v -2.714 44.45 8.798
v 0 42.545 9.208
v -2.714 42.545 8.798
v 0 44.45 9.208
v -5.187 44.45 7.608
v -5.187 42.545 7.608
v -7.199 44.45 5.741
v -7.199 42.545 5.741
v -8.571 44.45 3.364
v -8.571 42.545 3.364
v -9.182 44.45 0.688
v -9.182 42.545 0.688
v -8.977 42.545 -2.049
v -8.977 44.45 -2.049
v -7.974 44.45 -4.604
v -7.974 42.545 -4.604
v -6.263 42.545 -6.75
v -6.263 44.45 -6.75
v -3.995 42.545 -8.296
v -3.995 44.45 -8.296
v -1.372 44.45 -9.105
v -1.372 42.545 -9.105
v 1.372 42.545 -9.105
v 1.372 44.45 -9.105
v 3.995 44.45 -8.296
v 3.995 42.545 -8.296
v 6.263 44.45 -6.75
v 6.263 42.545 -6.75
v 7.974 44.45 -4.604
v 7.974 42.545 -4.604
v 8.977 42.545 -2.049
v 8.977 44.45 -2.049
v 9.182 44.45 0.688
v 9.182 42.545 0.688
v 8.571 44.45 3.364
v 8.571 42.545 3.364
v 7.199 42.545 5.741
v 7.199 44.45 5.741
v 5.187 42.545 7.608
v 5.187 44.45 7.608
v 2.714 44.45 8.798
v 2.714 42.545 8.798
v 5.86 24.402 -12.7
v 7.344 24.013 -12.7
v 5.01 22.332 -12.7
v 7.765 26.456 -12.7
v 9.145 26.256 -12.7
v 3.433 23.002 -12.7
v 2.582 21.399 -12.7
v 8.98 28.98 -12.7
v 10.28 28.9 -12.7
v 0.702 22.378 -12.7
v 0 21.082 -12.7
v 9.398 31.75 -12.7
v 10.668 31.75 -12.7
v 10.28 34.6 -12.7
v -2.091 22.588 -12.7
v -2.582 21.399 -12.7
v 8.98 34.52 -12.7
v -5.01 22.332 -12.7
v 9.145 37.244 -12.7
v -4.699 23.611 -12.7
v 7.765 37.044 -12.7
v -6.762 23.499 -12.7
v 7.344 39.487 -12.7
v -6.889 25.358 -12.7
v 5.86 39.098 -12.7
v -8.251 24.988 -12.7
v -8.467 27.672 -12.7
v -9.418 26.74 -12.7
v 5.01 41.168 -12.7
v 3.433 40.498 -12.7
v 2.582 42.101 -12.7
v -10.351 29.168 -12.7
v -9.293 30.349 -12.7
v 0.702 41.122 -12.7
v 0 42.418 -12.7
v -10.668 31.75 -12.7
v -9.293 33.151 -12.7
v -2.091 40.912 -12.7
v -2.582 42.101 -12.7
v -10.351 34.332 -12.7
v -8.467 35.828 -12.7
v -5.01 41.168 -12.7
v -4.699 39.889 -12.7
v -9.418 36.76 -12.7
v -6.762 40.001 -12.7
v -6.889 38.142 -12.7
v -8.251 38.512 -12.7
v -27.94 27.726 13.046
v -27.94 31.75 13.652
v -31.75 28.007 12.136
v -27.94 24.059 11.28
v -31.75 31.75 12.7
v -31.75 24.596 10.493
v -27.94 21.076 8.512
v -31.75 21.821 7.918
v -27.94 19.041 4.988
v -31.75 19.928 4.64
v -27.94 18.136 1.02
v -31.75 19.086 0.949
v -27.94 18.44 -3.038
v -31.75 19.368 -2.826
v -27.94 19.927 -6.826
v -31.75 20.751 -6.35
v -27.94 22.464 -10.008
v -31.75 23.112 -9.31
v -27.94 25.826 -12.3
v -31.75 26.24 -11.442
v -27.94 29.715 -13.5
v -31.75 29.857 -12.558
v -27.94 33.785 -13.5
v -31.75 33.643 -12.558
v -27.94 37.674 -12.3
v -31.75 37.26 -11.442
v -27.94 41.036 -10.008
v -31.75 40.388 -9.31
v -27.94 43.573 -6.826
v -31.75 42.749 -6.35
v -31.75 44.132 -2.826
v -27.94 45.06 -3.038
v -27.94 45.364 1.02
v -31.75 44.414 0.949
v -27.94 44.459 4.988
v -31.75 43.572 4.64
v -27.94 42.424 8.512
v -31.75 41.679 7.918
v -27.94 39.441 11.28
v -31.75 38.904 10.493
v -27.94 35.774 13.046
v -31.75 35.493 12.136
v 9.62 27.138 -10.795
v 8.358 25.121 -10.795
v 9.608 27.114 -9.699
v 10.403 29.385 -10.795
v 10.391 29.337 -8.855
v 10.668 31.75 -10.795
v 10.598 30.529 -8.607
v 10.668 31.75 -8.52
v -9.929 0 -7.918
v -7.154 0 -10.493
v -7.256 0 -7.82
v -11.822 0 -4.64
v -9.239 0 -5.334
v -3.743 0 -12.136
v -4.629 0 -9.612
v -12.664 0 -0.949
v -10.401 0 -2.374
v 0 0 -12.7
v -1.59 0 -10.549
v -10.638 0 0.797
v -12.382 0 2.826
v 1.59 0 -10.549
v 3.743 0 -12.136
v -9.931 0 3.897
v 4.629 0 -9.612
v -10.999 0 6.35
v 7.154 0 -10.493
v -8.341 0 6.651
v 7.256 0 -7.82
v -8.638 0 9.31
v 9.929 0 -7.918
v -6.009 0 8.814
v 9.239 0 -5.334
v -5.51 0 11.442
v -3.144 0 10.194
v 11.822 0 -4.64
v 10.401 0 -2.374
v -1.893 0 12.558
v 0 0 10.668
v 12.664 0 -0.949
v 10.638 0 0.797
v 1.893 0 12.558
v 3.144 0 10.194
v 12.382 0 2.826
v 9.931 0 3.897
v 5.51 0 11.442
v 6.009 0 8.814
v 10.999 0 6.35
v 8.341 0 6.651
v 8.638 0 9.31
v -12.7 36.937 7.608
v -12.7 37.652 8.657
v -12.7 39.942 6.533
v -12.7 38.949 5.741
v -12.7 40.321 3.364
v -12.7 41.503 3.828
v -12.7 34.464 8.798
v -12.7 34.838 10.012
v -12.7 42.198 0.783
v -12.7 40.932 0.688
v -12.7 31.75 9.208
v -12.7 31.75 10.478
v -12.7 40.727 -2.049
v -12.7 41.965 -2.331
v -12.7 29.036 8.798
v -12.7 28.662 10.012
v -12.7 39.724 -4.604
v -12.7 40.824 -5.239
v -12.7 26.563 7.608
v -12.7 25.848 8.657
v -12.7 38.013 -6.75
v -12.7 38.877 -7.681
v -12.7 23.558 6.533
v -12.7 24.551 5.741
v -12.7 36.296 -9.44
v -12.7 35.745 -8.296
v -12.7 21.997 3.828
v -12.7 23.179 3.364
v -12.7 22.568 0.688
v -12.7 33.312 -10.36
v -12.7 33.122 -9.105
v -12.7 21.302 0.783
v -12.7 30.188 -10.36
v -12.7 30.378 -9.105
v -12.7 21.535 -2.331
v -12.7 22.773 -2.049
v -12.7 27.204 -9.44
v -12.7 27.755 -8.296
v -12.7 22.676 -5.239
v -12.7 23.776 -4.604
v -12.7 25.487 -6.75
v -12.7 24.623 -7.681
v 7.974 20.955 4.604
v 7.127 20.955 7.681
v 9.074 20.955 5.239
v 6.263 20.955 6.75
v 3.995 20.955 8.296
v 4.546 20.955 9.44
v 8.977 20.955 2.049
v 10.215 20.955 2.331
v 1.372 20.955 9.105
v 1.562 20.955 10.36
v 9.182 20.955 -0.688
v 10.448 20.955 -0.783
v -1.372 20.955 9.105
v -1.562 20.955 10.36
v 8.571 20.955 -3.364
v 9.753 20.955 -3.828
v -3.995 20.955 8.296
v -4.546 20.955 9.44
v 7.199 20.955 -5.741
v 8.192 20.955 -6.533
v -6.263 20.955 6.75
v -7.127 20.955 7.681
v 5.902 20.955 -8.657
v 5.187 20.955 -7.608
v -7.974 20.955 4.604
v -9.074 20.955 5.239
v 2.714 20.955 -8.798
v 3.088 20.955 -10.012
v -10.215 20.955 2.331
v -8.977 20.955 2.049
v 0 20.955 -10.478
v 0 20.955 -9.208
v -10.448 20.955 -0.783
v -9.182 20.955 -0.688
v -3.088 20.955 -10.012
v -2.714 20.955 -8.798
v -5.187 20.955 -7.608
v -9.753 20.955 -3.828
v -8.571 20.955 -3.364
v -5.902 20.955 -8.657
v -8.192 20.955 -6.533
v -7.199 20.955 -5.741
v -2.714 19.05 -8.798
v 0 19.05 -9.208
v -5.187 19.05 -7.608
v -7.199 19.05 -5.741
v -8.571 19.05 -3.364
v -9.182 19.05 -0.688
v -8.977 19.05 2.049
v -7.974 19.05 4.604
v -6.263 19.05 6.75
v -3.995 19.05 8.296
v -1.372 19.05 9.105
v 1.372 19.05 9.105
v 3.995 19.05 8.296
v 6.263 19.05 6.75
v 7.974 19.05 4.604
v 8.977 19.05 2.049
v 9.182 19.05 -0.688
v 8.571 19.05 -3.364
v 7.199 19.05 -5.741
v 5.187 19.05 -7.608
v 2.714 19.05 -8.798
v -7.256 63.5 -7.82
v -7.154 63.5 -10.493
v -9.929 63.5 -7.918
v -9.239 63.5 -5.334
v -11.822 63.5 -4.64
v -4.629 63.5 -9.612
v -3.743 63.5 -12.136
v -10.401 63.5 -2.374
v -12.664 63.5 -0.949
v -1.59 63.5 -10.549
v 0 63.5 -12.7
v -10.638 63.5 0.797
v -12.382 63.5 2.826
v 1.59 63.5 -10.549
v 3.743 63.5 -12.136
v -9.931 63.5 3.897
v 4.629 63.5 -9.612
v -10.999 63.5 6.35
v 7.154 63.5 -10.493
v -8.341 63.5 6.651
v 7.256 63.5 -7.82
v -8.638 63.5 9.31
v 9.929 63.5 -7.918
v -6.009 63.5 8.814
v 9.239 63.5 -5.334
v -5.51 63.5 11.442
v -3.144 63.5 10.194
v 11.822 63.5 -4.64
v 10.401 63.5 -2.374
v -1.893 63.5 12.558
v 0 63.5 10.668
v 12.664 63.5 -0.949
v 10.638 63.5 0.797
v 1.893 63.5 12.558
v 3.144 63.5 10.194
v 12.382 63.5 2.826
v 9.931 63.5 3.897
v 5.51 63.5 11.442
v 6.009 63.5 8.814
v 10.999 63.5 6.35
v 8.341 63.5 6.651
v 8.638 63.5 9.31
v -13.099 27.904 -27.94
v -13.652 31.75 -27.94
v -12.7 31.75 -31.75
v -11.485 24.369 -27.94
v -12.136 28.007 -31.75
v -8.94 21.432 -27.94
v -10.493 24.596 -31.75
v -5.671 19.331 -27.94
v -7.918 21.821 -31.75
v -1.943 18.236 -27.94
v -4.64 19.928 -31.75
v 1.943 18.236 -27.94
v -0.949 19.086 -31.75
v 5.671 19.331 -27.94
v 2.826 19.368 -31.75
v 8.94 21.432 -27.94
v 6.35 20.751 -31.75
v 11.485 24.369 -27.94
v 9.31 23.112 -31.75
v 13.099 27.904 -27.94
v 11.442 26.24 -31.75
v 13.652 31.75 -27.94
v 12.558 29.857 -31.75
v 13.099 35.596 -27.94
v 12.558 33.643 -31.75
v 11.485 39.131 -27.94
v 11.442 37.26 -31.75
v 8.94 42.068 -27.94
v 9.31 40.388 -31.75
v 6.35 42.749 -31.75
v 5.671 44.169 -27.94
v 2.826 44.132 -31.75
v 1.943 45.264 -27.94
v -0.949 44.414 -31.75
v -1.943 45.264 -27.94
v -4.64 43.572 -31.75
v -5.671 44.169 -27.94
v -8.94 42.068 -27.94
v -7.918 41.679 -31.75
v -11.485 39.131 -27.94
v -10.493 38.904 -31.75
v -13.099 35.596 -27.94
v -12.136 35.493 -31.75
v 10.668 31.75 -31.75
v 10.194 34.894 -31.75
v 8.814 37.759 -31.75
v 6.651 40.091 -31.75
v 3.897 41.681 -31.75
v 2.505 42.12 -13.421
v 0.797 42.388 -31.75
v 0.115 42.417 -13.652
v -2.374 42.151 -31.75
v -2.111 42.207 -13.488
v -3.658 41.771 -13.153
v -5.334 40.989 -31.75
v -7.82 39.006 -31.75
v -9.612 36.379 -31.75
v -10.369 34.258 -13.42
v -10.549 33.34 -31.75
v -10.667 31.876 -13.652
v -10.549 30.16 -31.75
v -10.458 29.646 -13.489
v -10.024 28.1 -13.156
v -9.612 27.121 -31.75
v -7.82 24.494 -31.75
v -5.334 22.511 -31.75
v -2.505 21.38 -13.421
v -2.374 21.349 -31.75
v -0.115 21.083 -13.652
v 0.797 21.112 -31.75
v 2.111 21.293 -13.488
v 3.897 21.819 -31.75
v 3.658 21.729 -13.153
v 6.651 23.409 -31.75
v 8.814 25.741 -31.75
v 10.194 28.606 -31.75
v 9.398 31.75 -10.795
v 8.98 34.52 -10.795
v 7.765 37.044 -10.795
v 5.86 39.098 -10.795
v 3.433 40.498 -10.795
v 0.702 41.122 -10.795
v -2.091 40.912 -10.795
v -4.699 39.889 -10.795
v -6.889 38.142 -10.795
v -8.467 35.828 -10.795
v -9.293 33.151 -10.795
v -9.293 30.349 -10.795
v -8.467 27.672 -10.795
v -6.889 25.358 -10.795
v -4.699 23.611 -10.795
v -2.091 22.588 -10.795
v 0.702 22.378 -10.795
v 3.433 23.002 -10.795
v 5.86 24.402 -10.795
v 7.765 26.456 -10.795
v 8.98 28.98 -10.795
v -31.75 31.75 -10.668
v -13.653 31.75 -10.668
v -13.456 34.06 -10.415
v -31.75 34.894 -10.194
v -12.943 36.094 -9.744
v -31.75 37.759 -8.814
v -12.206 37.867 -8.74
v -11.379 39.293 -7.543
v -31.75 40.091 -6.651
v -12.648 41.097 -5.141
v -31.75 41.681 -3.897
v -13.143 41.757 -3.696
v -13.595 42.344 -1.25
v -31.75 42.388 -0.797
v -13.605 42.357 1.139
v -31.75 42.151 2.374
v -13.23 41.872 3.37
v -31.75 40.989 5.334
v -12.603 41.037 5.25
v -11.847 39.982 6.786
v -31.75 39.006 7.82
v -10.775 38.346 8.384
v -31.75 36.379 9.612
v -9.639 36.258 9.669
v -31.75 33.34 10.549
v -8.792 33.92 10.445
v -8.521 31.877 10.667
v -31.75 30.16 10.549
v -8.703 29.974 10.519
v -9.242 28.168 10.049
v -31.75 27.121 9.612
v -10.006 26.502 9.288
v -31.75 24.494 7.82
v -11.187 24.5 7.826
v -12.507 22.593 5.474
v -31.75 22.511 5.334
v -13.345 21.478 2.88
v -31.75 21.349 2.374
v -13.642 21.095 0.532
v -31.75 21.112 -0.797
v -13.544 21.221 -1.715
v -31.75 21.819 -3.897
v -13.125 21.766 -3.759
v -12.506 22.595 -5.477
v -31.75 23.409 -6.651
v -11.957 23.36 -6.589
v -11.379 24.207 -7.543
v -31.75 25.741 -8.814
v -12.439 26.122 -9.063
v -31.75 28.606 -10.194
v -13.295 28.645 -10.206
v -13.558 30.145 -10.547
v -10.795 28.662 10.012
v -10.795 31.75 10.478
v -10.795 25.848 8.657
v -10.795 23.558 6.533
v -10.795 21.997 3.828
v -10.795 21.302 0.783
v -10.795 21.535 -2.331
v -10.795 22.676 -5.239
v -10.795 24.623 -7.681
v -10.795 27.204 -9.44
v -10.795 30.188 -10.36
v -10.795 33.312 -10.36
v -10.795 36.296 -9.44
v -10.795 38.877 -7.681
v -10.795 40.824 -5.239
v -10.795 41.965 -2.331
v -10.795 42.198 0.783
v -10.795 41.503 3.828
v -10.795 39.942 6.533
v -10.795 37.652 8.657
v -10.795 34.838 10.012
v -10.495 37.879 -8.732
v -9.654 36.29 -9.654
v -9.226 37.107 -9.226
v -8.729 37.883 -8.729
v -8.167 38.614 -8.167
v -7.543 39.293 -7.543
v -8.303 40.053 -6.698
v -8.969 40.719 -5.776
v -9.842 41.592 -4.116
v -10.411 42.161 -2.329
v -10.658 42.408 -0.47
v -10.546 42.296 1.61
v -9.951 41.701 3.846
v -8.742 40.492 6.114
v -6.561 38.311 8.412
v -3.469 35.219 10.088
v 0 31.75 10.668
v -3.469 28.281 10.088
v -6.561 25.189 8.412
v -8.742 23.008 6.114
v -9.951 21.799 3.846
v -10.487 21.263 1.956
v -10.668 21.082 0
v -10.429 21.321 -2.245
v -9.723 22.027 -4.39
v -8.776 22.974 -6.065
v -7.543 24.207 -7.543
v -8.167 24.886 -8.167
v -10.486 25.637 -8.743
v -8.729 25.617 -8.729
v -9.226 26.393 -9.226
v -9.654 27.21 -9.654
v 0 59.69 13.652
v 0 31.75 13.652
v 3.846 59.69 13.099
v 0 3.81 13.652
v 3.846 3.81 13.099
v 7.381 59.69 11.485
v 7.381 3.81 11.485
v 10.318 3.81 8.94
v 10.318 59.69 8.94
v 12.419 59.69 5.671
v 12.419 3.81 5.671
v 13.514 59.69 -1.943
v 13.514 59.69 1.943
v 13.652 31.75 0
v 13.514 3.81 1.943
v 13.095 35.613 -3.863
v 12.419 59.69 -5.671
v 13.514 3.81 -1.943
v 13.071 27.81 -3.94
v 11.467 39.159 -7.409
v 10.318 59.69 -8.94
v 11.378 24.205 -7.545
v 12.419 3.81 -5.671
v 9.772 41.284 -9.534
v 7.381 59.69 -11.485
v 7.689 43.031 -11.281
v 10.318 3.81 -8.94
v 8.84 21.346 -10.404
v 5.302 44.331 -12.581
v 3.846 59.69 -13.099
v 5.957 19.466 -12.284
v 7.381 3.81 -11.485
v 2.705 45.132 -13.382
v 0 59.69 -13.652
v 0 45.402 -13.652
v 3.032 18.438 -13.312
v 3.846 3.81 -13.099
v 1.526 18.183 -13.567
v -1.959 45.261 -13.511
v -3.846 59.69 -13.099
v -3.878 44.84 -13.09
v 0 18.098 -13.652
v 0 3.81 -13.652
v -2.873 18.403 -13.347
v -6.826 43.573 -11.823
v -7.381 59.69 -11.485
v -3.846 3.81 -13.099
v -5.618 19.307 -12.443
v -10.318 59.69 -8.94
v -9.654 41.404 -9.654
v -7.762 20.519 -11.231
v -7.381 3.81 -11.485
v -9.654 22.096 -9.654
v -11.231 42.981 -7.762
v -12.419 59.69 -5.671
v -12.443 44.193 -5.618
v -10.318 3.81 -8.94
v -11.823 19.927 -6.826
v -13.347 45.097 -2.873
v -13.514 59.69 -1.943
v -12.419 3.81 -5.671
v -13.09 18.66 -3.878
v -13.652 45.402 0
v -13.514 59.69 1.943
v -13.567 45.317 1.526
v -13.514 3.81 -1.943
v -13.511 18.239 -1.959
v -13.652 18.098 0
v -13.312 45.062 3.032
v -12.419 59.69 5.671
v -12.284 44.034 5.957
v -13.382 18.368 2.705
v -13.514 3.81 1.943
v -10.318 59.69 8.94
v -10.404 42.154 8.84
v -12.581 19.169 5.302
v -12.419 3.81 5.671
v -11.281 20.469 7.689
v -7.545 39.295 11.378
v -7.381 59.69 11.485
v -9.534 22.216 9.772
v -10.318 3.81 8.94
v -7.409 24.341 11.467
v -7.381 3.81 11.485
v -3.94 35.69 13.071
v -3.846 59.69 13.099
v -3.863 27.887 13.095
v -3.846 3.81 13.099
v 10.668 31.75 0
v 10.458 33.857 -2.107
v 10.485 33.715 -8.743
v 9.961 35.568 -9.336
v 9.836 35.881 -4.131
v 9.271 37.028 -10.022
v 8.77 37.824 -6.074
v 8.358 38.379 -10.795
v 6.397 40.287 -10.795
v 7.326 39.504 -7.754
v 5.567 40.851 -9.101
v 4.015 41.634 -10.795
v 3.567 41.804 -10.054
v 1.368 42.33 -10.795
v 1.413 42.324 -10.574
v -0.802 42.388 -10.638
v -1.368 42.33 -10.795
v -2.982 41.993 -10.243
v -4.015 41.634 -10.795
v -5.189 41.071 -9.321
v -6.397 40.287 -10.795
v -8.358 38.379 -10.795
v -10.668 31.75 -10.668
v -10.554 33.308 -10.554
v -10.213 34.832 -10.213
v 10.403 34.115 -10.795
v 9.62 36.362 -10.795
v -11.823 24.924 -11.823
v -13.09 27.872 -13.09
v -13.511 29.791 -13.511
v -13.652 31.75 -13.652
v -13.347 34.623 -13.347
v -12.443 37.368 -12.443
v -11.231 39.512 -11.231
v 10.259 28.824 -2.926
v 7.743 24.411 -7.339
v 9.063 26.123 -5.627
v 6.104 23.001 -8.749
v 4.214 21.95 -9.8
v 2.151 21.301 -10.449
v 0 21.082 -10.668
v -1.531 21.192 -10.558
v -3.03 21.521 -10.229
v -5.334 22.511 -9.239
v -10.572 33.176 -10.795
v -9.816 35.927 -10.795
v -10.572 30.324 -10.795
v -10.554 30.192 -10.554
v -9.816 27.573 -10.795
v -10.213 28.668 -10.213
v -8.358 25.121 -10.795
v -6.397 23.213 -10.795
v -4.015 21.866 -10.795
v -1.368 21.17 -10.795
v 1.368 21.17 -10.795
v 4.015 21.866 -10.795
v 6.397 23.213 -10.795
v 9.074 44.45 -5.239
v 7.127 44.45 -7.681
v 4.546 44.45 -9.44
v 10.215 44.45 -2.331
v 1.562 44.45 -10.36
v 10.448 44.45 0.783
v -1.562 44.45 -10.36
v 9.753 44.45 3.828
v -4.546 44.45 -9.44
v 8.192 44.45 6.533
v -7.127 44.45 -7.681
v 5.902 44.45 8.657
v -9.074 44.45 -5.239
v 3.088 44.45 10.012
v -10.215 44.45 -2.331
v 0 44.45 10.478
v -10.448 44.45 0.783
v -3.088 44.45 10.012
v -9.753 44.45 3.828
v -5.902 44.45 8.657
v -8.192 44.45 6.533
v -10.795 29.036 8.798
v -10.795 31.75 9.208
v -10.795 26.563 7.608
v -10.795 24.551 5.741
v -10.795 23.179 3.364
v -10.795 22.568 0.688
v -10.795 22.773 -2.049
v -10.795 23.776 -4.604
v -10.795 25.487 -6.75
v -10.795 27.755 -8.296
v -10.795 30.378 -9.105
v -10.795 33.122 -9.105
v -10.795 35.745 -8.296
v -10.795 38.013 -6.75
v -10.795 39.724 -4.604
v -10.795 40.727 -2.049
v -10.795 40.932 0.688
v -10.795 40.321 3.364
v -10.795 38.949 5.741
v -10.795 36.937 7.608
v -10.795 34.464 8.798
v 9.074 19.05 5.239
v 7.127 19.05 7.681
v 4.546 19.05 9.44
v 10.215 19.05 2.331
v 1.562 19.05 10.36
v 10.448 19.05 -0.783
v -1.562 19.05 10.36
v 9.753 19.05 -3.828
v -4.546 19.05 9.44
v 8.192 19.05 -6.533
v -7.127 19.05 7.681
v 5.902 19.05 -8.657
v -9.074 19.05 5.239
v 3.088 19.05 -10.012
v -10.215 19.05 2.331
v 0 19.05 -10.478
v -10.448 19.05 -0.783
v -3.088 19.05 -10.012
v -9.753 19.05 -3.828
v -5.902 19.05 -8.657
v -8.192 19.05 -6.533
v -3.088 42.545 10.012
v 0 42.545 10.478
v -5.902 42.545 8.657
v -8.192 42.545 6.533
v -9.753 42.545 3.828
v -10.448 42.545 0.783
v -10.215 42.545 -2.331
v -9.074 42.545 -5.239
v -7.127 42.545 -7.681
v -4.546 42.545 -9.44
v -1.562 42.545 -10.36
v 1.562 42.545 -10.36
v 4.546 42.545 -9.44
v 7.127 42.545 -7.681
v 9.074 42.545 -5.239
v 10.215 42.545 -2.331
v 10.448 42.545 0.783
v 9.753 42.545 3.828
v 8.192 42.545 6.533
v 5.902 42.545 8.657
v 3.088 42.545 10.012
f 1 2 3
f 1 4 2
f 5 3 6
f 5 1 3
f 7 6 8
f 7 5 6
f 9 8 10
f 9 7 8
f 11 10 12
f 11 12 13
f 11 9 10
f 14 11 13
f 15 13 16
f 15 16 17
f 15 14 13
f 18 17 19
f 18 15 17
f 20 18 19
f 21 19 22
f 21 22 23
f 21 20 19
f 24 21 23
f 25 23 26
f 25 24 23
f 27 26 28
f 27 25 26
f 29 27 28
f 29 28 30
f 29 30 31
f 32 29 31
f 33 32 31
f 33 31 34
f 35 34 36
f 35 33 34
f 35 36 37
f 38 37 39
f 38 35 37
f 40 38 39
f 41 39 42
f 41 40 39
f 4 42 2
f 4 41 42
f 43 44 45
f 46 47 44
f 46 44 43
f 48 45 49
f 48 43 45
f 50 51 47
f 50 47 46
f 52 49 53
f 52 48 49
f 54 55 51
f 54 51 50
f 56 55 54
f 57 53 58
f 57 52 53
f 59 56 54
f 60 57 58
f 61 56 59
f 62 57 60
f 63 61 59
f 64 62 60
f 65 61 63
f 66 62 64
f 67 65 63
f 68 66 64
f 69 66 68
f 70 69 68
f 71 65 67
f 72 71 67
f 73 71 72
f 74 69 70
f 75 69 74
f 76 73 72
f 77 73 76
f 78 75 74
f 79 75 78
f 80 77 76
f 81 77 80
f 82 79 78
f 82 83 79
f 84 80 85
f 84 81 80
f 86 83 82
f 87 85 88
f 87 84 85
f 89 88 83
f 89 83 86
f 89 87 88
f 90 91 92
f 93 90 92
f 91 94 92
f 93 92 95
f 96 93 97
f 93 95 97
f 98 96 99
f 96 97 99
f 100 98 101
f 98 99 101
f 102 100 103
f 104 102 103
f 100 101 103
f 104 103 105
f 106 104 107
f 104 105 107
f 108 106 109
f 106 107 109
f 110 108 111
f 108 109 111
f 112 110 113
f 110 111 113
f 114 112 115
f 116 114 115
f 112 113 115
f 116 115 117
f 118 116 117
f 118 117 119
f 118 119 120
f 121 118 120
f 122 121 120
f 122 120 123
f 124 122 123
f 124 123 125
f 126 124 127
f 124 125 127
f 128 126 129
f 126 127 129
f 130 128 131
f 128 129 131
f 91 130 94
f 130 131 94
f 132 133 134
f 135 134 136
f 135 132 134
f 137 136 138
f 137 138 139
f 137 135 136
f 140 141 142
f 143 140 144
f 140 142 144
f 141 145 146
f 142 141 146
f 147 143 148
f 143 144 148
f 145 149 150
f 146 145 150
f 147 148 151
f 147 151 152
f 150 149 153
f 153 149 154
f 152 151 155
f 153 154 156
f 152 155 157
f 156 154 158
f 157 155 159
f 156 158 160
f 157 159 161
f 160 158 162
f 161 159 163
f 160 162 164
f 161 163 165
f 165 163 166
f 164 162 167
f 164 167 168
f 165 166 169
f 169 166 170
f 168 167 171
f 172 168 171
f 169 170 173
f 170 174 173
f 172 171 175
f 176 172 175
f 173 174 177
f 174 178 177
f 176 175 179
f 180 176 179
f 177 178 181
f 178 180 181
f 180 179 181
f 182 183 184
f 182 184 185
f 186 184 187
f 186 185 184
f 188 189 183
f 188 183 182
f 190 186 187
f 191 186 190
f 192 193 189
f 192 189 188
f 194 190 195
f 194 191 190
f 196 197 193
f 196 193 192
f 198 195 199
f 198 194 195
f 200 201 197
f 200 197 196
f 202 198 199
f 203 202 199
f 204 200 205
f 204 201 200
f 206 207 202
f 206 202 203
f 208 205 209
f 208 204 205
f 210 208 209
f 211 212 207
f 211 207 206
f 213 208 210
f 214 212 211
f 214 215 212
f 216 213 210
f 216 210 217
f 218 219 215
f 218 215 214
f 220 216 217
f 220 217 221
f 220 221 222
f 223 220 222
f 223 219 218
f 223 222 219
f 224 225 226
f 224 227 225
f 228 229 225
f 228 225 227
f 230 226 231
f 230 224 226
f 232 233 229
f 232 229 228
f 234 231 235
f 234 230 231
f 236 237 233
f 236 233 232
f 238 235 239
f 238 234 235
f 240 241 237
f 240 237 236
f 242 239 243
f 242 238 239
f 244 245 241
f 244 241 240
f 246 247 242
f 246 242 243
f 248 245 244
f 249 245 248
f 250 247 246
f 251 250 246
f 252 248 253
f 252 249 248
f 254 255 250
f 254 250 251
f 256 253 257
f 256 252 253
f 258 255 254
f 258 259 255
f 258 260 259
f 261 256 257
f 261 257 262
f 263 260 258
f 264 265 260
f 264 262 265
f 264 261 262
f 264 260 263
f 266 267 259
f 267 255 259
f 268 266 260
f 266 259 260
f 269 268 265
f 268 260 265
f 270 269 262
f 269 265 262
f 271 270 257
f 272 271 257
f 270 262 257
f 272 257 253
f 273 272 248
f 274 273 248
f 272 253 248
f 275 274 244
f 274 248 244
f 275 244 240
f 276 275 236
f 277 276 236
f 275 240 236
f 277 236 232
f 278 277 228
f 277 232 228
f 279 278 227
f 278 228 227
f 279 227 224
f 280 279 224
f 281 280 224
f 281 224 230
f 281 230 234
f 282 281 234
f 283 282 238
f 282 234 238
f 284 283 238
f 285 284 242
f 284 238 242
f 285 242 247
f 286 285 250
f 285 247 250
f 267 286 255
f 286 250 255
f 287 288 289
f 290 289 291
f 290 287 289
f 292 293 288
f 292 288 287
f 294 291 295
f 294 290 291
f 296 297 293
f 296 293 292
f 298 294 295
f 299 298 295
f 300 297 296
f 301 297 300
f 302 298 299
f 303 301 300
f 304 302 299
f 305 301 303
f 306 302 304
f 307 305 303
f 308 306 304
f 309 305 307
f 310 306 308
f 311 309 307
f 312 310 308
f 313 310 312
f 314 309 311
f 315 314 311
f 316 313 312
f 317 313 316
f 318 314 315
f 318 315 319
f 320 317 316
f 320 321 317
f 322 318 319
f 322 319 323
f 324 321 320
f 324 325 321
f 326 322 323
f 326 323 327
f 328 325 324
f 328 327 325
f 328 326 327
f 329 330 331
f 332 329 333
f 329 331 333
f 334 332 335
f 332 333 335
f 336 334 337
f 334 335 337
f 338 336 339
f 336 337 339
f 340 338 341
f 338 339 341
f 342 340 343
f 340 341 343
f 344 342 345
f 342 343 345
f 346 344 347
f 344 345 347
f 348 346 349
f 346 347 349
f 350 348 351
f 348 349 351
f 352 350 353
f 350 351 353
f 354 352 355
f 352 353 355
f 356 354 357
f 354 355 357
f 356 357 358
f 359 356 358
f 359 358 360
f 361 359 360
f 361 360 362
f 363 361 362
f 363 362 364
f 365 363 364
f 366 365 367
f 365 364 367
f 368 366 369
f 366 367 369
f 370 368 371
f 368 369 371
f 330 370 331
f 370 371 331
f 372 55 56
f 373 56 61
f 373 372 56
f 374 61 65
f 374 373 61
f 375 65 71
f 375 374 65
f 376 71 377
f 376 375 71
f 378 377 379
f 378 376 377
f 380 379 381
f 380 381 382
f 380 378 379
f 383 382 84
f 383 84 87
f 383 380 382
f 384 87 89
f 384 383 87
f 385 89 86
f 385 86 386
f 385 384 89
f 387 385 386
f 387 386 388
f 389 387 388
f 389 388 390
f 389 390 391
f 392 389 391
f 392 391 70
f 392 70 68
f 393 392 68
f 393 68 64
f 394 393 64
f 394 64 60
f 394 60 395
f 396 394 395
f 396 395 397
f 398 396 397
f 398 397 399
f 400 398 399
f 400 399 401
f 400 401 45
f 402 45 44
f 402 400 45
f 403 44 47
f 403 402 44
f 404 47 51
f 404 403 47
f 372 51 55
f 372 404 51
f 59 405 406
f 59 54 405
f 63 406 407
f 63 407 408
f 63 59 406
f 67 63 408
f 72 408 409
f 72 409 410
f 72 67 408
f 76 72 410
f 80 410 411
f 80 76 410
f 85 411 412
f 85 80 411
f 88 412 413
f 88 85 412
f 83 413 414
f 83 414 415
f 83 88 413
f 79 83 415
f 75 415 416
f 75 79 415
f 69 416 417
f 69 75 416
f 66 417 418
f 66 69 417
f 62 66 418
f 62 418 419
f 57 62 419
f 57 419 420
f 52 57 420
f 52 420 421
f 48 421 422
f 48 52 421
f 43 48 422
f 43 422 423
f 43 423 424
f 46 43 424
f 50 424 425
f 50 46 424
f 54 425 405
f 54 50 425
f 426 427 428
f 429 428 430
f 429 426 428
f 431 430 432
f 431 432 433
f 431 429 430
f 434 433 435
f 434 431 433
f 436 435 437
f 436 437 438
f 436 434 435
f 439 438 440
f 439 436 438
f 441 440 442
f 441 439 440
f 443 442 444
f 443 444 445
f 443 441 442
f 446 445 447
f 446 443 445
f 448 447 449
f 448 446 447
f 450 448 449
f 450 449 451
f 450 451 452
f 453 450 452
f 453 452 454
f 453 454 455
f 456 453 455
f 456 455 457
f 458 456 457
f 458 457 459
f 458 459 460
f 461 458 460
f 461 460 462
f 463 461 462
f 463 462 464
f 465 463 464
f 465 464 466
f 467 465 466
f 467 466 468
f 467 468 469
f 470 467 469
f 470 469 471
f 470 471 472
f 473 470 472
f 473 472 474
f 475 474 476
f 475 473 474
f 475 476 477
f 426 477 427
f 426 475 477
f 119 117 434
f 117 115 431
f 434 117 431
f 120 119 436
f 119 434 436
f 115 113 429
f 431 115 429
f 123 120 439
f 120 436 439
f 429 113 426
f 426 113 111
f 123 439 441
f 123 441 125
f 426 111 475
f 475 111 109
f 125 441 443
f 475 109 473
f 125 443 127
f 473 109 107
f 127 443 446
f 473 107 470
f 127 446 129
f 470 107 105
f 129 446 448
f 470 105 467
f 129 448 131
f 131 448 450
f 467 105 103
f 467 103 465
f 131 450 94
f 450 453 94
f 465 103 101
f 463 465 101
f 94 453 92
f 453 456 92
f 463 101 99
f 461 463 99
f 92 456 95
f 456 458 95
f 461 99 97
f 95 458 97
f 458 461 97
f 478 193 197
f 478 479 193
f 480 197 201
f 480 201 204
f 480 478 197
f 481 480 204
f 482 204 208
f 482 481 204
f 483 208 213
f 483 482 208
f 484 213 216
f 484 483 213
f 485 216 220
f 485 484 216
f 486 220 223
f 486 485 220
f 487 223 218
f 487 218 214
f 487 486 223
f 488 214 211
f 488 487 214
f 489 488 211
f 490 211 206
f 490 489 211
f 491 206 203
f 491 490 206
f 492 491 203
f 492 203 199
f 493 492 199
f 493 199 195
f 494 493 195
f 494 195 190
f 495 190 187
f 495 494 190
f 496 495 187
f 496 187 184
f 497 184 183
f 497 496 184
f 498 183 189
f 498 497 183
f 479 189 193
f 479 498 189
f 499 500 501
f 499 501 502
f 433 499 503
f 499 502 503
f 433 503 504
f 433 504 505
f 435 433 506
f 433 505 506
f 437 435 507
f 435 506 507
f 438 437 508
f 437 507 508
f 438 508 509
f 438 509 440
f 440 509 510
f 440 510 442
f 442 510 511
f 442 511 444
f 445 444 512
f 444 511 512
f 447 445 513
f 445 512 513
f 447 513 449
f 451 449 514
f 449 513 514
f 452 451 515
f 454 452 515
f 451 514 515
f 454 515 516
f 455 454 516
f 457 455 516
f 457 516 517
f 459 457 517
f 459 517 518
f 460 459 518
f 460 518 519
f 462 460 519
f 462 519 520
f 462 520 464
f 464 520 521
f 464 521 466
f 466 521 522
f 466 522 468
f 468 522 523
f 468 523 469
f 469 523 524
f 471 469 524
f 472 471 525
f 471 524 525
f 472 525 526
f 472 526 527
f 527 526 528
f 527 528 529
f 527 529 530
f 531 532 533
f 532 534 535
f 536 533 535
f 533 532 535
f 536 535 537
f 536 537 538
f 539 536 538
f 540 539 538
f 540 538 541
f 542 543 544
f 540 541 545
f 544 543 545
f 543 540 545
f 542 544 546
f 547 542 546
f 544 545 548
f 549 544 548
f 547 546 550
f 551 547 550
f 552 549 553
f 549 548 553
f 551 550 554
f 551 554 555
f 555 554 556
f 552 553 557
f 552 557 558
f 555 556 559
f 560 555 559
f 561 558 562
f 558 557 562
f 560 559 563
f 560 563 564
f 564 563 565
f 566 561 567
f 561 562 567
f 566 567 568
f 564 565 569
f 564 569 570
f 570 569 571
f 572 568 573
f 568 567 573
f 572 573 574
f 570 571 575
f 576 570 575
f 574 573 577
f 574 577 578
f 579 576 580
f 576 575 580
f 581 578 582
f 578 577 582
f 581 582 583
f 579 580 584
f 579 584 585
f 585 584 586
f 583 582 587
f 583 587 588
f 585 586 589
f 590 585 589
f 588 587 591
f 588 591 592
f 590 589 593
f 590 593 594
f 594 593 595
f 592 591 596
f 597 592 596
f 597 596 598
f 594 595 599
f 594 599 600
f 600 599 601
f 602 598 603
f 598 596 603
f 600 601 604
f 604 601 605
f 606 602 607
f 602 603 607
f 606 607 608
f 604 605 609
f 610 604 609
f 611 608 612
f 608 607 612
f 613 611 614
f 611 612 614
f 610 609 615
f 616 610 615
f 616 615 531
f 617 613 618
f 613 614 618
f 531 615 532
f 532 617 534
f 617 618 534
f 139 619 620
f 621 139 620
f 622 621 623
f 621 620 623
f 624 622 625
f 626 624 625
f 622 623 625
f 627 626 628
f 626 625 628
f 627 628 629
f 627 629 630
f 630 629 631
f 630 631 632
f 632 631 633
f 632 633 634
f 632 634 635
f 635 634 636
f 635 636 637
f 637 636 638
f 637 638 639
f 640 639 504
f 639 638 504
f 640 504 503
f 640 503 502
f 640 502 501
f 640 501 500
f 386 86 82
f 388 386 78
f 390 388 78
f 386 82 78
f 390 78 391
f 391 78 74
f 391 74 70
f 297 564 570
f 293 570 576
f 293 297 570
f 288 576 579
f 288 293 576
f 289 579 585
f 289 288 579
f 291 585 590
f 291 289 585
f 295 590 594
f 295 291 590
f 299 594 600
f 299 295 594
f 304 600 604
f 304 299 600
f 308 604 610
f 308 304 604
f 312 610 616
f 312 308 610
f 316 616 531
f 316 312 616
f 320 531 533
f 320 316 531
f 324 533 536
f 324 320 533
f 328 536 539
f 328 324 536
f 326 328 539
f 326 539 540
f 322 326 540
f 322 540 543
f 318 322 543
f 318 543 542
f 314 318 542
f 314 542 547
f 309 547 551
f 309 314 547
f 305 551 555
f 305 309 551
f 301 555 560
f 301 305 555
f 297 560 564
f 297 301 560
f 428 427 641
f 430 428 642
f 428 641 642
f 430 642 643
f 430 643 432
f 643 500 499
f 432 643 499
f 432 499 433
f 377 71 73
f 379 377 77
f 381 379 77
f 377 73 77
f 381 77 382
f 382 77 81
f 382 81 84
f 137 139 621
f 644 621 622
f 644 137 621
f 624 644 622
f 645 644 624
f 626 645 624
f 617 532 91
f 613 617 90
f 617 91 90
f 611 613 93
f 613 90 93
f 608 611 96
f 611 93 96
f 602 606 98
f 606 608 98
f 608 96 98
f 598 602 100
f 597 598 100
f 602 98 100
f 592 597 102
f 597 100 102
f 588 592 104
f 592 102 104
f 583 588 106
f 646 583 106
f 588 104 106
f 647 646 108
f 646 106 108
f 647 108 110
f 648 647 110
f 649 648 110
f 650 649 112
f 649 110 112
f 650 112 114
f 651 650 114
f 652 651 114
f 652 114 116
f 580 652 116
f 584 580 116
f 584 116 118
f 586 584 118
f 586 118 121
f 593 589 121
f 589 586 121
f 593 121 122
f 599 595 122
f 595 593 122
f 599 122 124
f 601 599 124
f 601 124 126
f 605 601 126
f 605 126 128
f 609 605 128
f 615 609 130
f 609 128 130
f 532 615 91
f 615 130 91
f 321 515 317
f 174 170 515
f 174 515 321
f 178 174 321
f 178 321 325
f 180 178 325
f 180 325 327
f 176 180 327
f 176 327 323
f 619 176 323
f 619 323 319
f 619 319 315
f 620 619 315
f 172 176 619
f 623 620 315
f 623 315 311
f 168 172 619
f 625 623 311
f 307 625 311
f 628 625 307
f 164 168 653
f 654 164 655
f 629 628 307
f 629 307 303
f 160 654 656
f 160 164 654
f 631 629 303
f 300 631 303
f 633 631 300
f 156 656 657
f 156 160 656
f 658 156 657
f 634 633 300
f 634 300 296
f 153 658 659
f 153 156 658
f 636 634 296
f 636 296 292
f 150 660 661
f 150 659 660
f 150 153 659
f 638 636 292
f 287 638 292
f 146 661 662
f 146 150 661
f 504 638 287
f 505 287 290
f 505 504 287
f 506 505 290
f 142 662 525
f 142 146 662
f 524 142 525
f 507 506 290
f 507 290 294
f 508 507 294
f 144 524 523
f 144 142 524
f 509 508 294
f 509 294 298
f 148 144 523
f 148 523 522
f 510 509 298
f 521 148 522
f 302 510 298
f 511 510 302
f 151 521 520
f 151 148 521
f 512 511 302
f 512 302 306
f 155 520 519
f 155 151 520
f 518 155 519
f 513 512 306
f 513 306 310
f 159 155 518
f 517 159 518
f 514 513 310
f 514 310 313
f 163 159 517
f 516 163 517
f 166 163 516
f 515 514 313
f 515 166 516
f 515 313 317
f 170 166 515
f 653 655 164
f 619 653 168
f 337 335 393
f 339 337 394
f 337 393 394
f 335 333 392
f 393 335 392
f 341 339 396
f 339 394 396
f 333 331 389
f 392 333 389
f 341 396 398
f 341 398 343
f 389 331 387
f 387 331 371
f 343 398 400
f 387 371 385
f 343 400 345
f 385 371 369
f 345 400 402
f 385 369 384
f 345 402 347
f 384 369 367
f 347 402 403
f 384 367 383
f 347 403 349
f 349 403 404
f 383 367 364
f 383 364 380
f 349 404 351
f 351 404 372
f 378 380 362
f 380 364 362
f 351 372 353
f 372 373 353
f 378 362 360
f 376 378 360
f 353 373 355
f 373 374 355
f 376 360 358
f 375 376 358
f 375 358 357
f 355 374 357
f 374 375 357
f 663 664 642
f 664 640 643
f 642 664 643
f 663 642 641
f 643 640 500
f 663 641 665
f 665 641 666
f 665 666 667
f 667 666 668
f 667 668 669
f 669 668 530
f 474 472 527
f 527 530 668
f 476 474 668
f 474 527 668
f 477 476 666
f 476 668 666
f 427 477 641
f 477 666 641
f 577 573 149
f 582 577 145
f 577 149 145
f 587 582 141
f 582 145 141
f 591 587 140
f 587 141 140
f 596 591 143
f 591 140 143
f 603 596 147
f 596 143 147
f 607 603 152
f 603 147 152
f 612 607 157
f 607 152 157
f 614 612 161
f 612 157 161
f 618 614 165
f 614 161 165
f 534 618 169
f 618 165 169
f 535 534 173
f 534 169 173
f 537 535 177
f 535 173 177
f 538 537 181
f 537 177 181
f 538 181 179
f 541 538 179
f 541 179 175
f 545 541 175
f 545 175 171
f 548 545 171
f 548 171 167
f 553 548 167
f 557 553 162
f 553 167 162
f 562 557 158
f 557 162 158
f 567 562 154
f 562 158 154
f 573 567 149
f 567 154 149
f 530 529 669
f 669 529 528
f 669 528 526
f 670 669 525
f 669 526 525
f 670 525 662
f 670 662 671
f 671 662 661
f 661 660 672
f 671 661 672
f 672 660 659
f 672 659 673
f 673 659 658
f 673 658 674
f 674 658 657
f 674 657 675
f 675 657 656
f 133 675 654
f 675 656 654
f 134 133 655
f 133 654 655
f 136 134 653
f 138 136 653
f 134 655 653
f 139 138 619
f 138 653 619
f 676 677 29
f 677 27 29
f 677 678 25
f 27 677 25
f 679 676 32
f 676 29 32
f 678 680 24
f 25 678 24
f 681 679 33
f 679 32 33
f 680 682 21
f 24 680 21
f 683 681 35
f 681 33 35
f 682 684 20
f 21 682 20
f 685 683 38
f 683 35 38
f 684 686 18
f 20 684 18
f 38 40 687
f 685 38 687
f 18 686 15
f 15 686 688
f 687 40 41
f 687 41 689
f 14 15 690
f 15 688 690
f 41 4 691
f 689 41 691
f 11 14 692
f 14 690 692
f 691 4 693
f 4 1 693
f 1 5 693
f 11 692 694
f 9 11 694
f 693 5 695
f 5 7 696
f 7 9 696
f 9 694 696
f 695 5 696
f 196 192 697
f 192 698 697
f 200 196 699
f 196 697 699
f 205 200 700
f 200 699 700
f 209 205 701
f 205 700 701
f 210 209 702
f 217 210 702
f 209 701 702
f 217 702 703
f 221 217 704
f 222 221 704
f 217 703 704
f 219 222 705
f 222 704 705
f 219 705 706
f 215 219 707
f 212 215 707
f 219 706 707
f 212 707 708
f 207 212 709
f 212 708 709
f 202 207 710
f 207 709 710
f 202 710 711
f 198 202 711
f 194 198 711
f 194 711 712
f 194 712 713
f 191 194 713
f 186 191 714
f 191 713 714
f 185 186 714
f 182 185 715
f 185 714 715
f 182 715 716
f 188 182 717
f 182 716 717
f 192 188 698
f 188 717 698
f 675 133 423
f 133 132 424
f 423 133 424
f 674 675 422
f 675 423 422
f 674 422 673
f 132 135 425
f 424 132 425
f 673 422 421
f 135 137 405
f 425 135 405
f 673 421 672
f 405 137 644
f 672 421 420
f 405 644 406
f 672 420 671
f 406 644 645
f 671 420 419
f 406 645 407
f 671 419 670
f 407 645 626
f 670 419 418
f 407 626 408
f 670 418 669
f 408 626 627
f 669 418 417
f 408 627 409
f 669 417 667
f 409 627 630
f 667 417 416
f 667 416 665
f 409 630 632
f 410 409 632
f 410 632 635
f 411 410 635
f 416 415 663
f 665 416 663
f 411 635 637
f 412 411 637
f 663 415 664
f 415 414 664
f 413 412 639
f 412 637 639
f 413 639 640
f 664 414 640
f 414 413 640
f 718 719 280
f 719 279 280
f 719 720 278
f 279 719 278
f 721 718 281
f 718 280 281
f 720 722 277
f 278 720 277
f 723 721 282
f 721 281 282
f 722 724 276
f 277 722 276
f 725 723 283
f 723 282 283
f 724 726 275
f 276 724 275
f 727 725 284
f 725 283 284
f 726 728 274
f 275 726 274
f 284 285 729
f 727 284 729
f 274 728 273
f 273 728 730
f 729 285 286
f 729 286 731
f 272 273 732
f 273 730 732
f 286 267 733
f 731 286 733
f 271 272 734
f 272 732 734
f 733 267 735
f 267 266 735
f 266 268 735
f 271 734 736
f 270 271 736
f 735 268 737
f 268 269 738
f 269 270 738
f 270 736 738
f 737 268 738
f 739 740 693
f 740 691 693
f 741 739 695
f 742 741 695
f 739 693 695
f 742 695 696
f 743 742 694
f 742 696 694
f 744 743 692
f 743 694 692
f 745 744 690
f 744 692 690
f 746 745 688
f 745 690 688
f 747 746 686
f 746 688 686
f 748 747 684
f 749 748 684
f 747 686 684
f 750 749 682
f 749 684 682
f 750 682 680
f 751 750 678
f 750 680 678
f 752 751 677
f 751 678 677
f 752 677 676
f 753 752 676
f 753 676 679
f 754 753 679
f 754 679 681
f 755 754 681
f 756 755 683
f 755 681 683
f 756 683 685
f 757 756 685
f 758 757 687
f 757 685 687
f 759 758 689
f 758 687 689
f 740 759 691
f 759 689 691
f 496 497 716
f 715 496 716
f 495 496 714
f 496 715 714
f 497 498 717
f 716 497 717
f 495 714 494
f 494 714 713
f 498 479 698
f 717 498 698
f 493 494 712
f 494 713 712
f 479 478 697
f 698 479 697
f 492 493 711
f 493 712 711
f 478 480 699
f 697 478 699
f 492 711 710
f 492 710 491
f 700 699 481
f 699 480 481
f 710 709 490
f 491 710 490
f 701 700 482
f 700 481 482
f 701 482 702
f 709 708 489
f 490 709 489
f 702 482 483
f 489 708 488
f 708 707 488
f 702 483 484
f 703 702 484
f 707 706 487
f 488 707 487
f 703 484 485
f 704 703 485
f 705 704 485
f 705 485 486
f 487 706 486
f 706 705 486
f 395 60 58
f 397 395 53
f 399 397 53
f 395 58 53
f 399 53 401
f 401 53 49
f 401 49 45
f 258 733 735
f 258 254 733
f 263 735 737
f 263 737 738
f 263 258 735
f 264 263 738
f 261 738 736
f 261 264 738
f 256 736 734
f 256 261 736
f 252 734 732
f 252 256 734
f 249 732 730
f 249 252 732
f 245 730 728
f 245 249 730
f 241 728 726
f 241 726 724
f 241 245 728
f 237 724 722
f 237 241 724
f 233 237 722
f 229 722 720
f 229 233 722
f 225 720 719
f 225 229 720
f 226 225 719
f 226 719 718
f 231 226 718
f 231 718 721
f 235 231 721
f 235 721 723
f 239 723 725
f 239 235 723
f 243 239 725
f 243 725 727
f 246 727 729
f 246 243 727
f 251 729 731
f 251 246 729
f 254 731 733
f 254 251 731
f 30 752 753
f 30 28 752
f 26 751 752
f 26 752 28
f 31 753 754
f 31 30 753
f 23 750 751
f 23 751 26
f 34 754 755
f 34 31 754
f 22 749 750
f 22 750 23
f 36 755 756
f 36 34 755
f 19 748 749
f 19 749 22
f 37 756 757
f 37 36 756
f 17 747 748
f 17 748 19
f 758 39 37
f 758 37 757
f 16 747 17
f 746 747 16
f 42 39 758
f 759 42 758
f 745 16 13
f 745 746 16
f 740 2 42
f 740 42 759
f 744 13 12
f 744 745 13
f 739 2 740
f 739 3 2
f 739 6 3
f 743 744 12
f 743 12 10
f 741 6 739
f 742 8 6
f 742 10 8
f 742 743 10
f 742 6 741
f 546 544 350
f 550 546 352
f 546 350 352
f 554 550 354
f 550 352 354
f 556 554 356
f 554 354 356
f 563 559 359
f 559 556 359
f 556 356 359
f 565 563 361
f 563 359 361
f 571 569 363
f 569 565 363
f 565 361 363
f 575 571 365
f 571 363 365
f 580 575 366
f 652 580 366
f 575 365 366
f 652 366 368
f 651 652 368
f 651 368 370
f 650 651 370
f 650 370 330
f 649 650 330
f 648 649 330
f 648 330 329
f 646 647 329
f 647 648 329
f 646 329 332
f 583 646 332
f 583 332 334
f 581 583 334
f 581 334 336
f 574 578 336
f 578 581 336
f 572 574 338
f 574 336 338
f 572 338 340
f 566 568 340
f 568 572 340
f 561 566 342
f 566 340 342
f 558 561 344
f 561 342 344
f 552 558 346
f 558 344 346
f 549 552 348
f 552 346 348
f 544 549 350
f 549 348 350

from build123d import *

# Parameters (mm, degrees)
SKETCH1_R                = 13.6525
SKETCH1_R_2              = 10.668
BOSS_EXTRUDE1_DEPTH      = 63.5
SKETCH3_R                = 10.668
CUT_EXTRUDE2_DEPTH       = 69.85
BOSS_EXTRUDE2_REACH      = 81.247
BOSS_EXTRUDE2_END_RADIUS = 13.6525
SKETCH4_R                = 13.6525
SKETCH4_R_2              = 10.668
SKETCH5_R                = 10.668
CUT_EXTRUDE3_DEPTH       = 69.85
BOSS_EXTRUDE3_REACH      = 86.272
BOSS_EXTRUDE3_END_RADIUS = 13.6525
SKETCH6_R                = 13.6525
SKETCH6_R_2              = 10.668
SKETCH8_R                = 10.668
CUT_EXTRUDE5_DEPTH       = 69.85
SKETCH10_W               = 1.27
SKETCH10_H               = 1.905
SKETCH11_W               = 1.27
SKETCH11_H               = 1.905
SKETCH12_W               = 1.905
SKETCH12_H               = 1.27
SKETCH13_W               = 1.905
SKETCH13_H               = 1.27


with BuildPart() as part:
    # Sketch1 → Boss-Extrude1 (new body)
    with BuildSketch(Plane(origin=(0, 0, 0), x_dir=(1, 0, 0), z_dir=(0, 1, 0))):
        Circle(SKETCH1_R)
        Circle(SKETCH1_R_2, mode=Mode.SUBTRACT)
    extrude(amount=BOSS_EXTRUDE1_DEPTH)

    # Sketch3 → Cut-Extrude2 (cut)
    with BuildSketch(Plane.XY):
        with Locations((0, 31.75)):
            Circle(SKETCH3_R)
    extrude(amount=-CUT_EXTRUDE2_DEPTH, mode=Mode.SUBTRACT)

    # Boss-Extrude2: up to this cylinder (the profile starts outside it)
    boss_extrude2_end = Plane(origin=(0, 31.75, 0), z_dir=(0, -1, 0)) * Cylinder(BOSS_EXTRUDE2_END_RADIUS, 190.799, mode=Mode.PRIVATE)
    # Sketch4 → Boss-Extrude2 (add, up to the surface)
    with BuildSketch(Plane.XY.offset(-31.75), mode=Mode.PRIVATE) as boss_extrude2_sk1:
        with Locations((0, 31.75)):
            Circle(SKETCH4_R)
        with Locations((0, 31.75)):
            Circle(SKETCH4_R_2, mode=Mode.SUBTRACT)
    boss_extrude2_tool1 = extrude(boss_extrude2_sk1.sketch, amount=BOSS_EXTRUDE2_REACH, mode=Mode.PRIVATE) - boss_extrude2_end
    add(boss_extrude2_tool1.solids().sort_by_distance((-13.266349, 31.75, -31.75))[0])

    # Sketch5 → Cut-Extrude3 (cut)
    with BuildSketch(Plane(origin=(0, 0, 0), x_dir=(0, 0, -1), z_dir=(1, 0, 0))):
        with Locations((0, 31.75)):
            Circle(SKETCH5_R)
    extrude(amount=-CUT_EXTRUDE3_DEPTH, mode=Mode.SUBTRACT)

    # Boss-Extrude3: up to this cylinder (the profile starts outside it)
    boss_extrude3_end = Plane(origin=(0, 31.75, 0), z_dir=(0, -1, 0)) * Cylinder(BOSS_EXTRUDE3_END_RADIUS, 200.849, mode=Mode.PRIVATE)
    # Sketch6 → Boss-Extrude3 (add, up to the surface)
    with BuildSketch(Plane(origin=(-31.75, 0, 0), x_dir=(0, 0, -1), z_dir=(1, 0, 0)), mode=Mode.PRIVATE) as boss_extrude3_sk1:
        with Locations((0, 31.75)):
            Circle(SKETCH6_R)
        with Locations((0, 31.75)):
            Circle(SKETCH6_R_2, mode=Mode.SUBTRACT)
    boss_extrude3_tool1 = extrude(boss_extrude3_sk1.sketch, amount=BOSS_EXTRUDE3_REACH, mode=Mode.PRIVATE) - boss_extrude3_end
    add(boss_extrude3_tool1.solids().sort_by_distance((-31.75, 31.75, 13.266349))[0])

    # Sketch8 → Cut-Extrude5 (cut)
    with BuildSketch(Plane.XY):
        with Locations((0, 31.75)):
            Circle(SKETCH8_R)
    extrude(amount=-CUT_EXTRUDE5_DEPTH, mode=Mode.SUBTRACT)

    # Sketch13 → Revolve7 (revolve)
    with BuildSketch(Plane(origin=(0, 0, 0), x_dir=(0, 0, -1), z_dir=(1, 0, 0))):
        with Locations((11.7475, 41.783)):
            Rectangle(SKETCH13_W, SKETCH13_H)
    revolve(axis=Axis((0, 31.75, -31.75), (0, 0, 1)))

    # Sketch14 → Cut-Revolve1 (revolve, cut)
    with BuildSketch(Plane(origin=(0, 0, 0), x_dir=(0, 0, -1), z_dir=(1, 0, 0))):
        Polygon((13.6525, 0), (13.6525, 3.81), (12.7, 0), align=None)
    cut_revolve1 = revolve(axis=Axis((0, 0, 0), (0, 1, 0)), mode=Mode.SUBTRACT)

    # Mirror1: Cut-Revolve1 across plane
    add(cut_revolve1.mirror(Plane.ZX.offset(31.75)), mode=Mode.SUBTRACT)

    # Sketch15 → Cut-Revolve2 (revolve, cut)
    with BuildSketch(Plane(origin=(0, 31.75, 0), x_dir=(1, 0, 0), z_dir=(0, 1, 0))):
        Polygon((-13.6525, 31.75), (-13.6525, 27.94), (-12.7, 31.75), align=None)
    revolve(axis=Axis((0, 31.75, -31.75), (0, 0, 1)), mode=Mode.SUBTRACT)

    # Sketch16 → Cut-Revolve3 (revolve, cut)
    with BuildSketch(Plane(origin=(0, 31.75, 0), x_dir=(1, 0, 0), z_dir=(0, 1, 0))):
        Polygon((-31.75, -13.6525), (-27.94, -13.6525), (-31.75, -12.7), align=None)
    revolve(axis=Axis((-31.75, 31.75, 0), (1, 0, 0)), mode=Mode.SUBTRACT)


with BuildPart() as body_2:
    # Sketch10 → Revolve1 (revolve)
    with BuildSketch(Plane.XY):
        with Locations((-9.8425, 43.4975)):
            Rectangle(SKETCH10_W, SKETCH10_H)
    revolve(axis=Axis((0, 63.5, 0), (0, -1, 0)))


with BuildPart() as body_3:
    # Sketch11 → Revolve5 (revolve)
    with BuildSketch(Plane.XY):
        with Locations((-9.8425, 20.0025)):
            Rectangle(SKETCH11_W, SKETCH11_H)
    revolve(axis=Axis((0, 0, 0), (0, 1, 0)))


with BuildPart() as body_4:
    # Sketch12 → Revolve6 (revolve)
    with BuildSketch(Plane.XY):
        with Locations((-11.7475, 41.5925)):
            Rectangle(SKETCH12_W, SKETCH12_H)
    revolve(axis=Axis((-31.75, 31.75, 0), (1, 0, 0)))


solid = Compound([part.part, body_2.part, body_3.part, body_4.part])
